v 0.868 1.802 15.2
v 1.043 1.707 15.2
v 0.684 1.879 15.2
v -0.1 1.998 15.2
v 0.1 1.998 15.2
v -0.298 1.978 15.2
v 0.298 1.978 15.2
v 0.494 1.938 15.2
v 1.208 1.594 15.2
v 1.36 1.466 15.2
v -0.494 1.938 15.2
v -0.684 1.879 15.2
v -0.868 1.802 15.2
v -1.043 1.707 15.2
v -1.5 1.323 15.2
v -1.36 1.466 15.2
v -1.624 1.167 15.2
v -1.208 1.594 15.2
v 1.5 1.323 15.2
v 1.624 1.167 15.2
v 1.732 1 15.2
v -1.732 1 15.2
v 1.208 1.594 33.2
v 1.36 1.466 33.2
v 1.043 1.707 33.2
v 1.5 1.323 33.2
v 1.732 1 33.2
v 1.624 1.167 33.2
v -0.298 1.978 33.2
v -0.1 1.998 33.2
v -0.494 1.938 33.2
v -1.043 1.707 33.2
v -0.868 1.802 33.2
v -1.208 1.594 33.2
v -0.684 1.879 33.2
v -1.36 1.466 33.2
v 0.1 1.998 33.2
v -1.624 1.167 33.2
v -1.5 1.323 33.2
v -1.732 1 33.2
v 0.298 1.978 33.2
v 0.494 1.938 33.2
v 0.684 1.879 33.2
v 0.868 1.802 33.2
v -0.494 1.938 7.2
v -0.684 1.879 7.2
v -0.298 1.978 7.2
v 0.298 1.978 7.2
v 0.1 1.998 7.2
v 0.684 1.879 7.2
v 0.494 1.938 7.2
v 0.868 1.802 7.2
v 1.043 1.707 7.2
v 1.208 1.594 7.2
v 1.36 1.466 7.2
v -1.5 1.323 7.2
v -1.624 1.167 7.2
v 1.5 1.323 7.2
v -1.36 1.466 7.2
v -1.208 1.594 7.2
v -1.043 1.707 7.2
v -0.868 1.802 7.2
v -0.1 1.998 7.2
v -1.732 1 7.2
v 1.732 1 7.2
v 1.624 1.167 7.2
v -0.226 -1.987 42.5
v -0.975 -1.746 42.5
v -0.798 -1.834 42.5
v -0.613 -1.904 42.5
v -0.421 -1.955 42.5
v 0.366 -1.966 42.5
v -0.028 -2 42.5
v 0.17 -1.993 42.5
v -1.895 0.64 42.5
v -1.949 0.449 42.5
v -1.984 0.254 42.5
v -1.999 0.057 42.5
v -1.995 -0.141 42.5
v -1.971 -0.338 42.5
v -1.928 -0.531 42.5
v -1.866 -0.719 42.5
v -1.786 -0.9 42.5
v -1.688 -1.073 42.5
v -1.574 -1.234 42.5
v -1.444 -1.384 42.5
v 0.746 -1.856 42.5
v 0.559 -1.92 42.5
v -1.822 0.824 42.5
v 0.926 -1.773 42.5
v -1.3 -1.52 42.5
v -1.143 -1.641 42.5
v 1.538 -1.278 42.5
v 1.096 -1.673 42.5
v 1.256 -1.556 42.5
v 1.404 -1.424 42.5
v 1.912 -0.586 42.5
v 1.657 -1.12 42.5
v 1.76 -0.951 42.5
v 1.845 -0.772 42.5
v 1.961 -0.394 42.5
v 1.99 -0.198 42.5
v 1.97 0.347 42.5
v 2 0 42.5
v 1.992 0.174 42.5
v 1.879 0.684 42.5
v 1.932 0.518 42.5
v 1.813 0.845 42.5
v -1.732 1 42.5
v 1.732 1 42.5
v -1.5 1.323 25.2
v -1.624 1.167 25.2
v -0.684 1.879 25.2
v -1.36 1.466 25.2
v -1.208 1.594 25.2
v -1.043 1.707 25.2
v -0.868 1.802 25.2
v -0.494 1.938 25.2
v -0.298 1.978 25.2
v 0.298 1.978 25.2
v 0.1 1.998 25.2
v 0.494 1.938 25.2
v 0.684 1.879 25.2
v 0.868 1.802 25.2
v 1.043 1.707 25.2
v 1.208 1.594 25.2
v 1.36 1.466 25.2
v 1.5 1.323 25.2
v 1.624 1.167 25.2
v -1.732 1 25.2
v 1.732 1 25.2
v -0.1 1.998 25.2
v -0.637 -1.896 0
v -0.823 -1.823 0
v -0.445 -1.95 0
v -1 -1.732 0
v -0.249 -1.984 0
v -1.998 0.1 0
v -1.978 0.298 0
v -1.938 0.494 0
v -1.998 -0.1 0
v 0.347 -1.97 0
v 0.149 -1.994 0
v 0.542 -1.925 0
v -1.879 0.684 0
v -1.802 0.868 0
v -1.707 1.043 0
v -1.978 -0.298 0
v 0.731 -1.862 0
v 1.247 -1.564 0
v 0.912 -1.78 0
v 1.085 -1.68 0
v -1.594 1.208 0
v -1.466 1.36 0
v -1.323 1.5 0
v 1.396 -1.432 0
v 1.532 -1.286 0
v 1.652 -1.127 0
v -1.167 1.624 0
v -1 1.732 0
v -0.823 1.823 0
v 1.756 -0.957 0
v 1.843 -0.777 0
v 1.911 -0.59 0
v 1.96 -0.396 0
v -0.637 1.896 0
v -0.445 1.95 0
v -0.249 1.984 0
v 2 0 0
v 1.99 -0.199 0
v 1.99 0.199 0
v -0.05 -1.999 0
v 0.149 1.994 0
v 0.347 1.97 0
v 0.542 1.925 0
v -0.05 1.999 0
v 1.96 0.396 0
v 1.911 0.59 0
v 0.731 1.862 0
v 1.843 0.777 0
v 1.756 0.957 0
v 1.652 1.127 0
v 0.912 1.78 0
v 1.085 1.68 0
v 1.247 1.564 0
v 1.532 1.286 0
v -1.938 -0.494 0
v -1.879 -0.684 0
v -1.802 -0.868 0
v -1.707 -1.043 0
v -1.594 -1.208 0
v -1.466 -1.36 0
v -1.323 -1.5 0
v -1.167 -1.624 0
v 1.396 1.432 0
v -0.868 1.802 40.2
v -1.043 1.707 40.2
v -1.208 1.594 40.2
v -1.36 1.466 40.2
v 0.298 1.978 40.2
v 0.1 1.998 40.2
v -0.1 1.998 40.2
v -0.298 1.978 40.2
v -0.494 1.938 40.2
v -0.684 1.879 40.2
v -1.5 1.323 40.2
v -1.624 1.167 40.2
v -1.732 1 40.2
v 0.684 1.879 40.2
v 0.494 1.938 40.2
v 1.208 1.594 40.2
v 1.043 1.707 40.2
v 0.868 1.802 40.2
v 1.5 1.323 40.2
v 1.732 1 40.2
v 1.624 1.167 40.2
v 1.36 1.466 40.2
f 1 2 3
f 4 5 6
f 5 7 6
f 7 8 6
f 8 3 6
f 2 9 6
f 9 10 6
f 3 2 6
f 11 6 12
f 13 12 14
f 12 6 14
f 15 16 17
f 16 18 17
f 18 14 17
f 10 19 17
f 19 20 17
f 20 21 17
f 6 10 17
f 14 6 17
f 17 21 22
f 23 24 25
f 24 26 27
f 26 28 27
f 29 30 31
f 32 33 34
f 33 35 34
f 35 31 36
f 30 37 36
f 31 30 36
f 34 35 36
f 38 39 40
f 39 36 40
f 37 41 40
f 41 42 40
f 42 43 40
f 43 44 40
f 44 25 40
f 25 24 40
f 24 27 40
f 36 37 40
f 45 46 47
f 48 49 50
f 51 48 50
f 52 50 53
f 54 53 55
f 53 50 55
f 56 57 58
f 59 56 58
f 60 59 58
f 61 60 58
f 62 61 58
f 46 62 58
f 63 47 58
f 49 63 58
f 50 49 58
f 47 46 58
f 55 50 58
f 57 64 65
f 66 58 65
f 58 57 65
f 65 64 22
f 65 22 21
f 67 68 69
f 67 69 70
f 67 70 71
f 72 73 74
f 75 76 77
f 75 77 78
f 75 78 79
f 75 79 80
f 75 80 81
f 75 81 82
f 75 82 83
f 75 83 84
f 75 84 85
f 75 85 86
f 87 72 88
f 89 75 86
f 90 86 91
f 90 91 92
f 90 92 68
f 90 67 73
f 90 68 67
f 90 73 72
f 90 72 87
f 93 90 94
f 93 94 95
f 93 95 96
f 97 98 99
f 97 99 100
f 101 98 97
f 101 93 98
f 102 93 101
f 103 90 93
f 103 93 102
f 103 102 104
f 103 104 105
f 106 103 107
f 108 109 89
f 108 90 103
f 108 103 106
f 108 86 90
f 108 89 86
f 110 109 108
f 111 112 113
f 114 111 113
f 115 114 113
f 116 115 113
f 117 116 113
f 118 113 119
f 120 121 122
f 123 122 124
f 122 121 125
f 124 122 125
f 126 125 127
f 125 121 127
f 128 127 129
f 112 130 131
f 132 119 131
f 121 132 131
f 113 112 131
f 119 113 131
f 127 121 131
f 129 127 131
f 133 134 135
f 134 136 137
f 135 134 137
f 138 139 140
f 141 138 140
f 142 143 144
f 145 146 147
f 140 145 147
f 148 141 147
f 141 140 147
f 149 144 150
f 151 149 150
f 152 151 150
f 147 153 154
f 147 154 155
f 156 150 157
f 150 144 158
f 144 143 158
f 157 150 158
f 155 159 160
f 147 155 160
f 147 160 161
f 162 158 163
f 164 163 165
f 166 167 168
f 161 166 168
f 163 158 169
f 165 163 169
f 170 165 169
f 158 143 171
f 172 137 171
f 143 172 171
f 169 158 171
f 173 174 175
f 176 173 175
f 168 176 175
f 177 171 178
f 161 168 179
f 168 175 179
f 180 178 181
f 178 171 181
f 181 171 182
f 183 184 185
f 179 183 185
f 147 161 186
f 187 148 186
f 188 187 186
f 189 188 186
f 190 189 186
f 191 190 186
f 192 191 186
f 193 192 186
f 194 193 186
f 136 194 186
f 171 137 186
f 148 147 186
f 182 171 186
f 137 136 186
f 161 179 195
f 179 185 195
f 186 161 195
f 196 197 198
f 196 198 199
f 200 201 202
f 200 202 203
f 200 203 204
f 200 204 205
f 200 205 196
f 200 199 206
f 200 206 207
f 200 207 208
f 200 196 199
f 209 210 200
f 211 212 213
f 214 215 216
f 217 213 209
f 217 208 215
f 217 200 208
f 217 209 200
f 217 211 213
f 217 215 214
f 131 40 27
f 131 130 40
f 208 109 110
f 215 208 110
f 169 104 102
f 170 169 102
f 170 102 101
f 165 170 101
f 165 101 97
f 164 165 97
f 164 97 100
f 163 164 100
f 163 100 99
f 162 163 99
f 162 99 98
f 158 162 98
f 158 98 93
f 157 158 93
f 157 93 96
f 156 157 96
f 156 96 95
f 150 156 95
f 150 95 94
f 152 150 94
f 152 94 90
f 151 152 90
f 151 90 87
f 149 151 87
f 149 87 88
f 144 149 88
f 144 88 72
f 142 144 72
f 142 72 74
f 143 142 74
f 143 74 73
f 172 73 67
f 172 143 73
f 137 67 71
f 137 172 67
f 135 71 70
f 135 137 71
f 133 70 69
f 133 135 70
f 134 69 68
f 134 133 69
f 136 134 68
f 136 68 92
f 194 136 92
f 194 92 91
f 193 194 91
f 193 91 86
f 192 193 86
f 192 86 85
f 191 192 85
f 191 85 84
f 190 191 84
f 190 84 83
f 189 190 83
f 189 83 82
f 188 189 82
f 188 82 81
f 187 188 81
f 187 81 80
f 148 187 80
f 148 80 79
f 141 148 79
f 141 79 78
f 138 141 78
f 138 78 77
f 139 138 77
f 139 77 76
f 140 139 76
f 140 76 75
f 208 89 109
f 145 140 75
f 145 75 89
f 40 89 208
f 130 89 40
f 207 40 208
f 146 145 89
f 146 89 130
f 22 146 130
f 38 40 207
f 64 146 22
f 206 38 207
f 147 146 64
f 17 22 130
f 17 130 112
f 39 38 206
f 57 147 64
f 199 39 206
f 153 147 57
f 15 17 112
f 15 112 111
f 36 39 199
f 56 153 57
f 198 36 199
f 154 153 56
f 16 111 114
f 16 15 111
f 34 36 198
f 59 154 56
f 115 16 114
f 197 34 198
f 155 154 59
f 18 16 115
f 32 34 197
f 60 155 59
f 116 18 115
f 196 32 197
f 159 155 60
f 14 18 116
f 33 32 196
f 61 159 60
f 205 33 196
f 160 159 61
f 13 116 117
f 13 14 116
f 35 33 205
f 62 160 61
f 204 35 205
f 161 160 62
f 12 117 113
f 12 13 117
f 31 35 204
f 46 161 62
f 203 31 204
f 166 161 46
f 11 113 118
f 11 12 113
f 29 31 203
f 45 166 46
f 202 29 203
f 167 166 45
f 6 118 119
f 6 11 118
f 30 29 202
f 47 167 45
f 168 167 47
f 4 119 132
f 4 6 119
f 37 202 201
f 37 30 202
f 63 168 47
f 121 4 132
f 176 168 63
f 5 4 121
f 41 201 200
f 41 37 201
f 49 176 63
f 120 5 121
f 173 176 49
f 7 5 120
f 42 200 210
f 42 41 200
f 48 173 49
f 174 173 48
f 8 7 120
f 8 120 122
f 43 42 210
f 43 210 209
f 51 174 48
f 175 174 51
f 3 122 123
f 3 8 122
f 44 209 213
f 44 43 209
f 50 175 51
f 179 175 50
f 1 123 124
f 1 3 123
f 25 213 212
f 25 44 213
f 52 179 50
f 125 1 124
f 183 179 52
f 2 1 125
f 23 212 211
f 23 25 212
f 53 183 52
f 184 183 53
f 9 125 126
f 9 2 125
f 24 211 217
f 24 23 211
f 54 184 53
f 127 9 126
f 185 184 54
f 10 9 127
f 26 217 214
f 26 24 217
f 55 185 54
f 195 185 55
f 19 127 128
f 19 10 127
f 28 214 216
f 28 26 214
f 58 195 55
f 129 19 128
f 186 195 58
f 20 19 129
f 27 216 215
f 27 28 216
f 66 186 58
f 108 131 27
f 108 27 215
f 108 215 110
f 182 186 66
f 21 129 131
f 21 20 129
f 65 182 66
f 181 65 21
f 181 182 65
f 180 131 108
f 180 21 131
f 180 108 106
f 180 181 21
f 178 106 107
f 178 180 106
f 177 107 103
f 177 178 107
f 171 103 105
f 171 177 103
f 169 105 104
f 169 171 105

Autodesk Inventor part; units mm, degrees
ref_plane "YZ Plane" through (0, 0, 0) normal (1, 0, 0) x (0, 1, 0)
ref_plane "XZ Plane" through (0, 0, 0) normal (0, 1, 0) x (-1, 0, 0)
ref_plane "XY Plane" through (0, 0, 0) normal (0, 0, 1) x (1, 0, 0)
sketch "スケッチ1" plane through (0, 0, 0) normal (0, 0, 1) x (1, 0, 0)
  circle A0 centre (0, 0) radius 2
  dimension "d0" = 4
extrude "押し出し1" add sketch "スケッチ1" along normal blind 42.5
sketch "スケッチ2" plane through (0, 0, 42.5) normal (0, 0, 1) x (1, 0, 0)
  circle A0 centre (0, 0) radius 2 projected
  line L0 (-1.7321, 1) -> (1.7321, 1)
  dimension "d3" = 1
extrude "押し出し2" cut sketch "スケッチ2" against normal blind 2.3 contours L0 A0 picked at (0.4849, 1.1242)
sketch "スケッチ3" plane through (0, 0, 42.5) normal (0, 0, 1) x (1, 0, 0)
  point P0 (0, 0)
sketch "スケッチ4" plane through (0, 0, 0) normal (0, 0, -1) x (-1, 0, 0)
  arc A0 (1.7321, 1) -> (-1.7321, 1) centre (0, 0) ccw projected
  circle A1 centre (0, 0) radius 2 projected
sketch "スケッチ5" plane through (-1.7321, 1, 42.5) normal (0, 1, 0) x (1, 0, 0)
  point P0 (1.7321, 42.5)
sketch "スケッチ6" plane through (-1.7321, 1, 42.5) normal (0, 1, 0) x (1, 0, 0)
  line L0 (-15.0722, 17.3) -> (4.9278, 17.3)
  line L1 (4.9278, 17.3) -> (4.9278, 9.3)
  line L2 (4.9278, 9.3) -> (-15.0722, 9.3)
  line L3 (-15.0722, 9.3) -> (-15.0722, 17.3)
  line L4 (3.4641, 2.3) -> (0, 2.3) projected
  line L5 (-8.306, 35.3) -> (11.694, 35.3)
  line L6 (11.694, 35.3) -> (11.694, 27.3)
  line L7 (11.694, 27.3) -> (-8.306, 27.3)
  line L8 (-8.306, 27.3) -> (-8.306, 35.3)
  point P0 (1.7321, 42.5)
  dimension "d8" = 8
  dimension "d9" = 20
  dimension "d10" = 15
  dimension "d12" = 20
  dimension "d13" = 25
  dimension "d16" = 8
extrude "押し出し3" cut sketch "スケッチ6" along normal blind 10
properties part number "3SR03_振子軸"
